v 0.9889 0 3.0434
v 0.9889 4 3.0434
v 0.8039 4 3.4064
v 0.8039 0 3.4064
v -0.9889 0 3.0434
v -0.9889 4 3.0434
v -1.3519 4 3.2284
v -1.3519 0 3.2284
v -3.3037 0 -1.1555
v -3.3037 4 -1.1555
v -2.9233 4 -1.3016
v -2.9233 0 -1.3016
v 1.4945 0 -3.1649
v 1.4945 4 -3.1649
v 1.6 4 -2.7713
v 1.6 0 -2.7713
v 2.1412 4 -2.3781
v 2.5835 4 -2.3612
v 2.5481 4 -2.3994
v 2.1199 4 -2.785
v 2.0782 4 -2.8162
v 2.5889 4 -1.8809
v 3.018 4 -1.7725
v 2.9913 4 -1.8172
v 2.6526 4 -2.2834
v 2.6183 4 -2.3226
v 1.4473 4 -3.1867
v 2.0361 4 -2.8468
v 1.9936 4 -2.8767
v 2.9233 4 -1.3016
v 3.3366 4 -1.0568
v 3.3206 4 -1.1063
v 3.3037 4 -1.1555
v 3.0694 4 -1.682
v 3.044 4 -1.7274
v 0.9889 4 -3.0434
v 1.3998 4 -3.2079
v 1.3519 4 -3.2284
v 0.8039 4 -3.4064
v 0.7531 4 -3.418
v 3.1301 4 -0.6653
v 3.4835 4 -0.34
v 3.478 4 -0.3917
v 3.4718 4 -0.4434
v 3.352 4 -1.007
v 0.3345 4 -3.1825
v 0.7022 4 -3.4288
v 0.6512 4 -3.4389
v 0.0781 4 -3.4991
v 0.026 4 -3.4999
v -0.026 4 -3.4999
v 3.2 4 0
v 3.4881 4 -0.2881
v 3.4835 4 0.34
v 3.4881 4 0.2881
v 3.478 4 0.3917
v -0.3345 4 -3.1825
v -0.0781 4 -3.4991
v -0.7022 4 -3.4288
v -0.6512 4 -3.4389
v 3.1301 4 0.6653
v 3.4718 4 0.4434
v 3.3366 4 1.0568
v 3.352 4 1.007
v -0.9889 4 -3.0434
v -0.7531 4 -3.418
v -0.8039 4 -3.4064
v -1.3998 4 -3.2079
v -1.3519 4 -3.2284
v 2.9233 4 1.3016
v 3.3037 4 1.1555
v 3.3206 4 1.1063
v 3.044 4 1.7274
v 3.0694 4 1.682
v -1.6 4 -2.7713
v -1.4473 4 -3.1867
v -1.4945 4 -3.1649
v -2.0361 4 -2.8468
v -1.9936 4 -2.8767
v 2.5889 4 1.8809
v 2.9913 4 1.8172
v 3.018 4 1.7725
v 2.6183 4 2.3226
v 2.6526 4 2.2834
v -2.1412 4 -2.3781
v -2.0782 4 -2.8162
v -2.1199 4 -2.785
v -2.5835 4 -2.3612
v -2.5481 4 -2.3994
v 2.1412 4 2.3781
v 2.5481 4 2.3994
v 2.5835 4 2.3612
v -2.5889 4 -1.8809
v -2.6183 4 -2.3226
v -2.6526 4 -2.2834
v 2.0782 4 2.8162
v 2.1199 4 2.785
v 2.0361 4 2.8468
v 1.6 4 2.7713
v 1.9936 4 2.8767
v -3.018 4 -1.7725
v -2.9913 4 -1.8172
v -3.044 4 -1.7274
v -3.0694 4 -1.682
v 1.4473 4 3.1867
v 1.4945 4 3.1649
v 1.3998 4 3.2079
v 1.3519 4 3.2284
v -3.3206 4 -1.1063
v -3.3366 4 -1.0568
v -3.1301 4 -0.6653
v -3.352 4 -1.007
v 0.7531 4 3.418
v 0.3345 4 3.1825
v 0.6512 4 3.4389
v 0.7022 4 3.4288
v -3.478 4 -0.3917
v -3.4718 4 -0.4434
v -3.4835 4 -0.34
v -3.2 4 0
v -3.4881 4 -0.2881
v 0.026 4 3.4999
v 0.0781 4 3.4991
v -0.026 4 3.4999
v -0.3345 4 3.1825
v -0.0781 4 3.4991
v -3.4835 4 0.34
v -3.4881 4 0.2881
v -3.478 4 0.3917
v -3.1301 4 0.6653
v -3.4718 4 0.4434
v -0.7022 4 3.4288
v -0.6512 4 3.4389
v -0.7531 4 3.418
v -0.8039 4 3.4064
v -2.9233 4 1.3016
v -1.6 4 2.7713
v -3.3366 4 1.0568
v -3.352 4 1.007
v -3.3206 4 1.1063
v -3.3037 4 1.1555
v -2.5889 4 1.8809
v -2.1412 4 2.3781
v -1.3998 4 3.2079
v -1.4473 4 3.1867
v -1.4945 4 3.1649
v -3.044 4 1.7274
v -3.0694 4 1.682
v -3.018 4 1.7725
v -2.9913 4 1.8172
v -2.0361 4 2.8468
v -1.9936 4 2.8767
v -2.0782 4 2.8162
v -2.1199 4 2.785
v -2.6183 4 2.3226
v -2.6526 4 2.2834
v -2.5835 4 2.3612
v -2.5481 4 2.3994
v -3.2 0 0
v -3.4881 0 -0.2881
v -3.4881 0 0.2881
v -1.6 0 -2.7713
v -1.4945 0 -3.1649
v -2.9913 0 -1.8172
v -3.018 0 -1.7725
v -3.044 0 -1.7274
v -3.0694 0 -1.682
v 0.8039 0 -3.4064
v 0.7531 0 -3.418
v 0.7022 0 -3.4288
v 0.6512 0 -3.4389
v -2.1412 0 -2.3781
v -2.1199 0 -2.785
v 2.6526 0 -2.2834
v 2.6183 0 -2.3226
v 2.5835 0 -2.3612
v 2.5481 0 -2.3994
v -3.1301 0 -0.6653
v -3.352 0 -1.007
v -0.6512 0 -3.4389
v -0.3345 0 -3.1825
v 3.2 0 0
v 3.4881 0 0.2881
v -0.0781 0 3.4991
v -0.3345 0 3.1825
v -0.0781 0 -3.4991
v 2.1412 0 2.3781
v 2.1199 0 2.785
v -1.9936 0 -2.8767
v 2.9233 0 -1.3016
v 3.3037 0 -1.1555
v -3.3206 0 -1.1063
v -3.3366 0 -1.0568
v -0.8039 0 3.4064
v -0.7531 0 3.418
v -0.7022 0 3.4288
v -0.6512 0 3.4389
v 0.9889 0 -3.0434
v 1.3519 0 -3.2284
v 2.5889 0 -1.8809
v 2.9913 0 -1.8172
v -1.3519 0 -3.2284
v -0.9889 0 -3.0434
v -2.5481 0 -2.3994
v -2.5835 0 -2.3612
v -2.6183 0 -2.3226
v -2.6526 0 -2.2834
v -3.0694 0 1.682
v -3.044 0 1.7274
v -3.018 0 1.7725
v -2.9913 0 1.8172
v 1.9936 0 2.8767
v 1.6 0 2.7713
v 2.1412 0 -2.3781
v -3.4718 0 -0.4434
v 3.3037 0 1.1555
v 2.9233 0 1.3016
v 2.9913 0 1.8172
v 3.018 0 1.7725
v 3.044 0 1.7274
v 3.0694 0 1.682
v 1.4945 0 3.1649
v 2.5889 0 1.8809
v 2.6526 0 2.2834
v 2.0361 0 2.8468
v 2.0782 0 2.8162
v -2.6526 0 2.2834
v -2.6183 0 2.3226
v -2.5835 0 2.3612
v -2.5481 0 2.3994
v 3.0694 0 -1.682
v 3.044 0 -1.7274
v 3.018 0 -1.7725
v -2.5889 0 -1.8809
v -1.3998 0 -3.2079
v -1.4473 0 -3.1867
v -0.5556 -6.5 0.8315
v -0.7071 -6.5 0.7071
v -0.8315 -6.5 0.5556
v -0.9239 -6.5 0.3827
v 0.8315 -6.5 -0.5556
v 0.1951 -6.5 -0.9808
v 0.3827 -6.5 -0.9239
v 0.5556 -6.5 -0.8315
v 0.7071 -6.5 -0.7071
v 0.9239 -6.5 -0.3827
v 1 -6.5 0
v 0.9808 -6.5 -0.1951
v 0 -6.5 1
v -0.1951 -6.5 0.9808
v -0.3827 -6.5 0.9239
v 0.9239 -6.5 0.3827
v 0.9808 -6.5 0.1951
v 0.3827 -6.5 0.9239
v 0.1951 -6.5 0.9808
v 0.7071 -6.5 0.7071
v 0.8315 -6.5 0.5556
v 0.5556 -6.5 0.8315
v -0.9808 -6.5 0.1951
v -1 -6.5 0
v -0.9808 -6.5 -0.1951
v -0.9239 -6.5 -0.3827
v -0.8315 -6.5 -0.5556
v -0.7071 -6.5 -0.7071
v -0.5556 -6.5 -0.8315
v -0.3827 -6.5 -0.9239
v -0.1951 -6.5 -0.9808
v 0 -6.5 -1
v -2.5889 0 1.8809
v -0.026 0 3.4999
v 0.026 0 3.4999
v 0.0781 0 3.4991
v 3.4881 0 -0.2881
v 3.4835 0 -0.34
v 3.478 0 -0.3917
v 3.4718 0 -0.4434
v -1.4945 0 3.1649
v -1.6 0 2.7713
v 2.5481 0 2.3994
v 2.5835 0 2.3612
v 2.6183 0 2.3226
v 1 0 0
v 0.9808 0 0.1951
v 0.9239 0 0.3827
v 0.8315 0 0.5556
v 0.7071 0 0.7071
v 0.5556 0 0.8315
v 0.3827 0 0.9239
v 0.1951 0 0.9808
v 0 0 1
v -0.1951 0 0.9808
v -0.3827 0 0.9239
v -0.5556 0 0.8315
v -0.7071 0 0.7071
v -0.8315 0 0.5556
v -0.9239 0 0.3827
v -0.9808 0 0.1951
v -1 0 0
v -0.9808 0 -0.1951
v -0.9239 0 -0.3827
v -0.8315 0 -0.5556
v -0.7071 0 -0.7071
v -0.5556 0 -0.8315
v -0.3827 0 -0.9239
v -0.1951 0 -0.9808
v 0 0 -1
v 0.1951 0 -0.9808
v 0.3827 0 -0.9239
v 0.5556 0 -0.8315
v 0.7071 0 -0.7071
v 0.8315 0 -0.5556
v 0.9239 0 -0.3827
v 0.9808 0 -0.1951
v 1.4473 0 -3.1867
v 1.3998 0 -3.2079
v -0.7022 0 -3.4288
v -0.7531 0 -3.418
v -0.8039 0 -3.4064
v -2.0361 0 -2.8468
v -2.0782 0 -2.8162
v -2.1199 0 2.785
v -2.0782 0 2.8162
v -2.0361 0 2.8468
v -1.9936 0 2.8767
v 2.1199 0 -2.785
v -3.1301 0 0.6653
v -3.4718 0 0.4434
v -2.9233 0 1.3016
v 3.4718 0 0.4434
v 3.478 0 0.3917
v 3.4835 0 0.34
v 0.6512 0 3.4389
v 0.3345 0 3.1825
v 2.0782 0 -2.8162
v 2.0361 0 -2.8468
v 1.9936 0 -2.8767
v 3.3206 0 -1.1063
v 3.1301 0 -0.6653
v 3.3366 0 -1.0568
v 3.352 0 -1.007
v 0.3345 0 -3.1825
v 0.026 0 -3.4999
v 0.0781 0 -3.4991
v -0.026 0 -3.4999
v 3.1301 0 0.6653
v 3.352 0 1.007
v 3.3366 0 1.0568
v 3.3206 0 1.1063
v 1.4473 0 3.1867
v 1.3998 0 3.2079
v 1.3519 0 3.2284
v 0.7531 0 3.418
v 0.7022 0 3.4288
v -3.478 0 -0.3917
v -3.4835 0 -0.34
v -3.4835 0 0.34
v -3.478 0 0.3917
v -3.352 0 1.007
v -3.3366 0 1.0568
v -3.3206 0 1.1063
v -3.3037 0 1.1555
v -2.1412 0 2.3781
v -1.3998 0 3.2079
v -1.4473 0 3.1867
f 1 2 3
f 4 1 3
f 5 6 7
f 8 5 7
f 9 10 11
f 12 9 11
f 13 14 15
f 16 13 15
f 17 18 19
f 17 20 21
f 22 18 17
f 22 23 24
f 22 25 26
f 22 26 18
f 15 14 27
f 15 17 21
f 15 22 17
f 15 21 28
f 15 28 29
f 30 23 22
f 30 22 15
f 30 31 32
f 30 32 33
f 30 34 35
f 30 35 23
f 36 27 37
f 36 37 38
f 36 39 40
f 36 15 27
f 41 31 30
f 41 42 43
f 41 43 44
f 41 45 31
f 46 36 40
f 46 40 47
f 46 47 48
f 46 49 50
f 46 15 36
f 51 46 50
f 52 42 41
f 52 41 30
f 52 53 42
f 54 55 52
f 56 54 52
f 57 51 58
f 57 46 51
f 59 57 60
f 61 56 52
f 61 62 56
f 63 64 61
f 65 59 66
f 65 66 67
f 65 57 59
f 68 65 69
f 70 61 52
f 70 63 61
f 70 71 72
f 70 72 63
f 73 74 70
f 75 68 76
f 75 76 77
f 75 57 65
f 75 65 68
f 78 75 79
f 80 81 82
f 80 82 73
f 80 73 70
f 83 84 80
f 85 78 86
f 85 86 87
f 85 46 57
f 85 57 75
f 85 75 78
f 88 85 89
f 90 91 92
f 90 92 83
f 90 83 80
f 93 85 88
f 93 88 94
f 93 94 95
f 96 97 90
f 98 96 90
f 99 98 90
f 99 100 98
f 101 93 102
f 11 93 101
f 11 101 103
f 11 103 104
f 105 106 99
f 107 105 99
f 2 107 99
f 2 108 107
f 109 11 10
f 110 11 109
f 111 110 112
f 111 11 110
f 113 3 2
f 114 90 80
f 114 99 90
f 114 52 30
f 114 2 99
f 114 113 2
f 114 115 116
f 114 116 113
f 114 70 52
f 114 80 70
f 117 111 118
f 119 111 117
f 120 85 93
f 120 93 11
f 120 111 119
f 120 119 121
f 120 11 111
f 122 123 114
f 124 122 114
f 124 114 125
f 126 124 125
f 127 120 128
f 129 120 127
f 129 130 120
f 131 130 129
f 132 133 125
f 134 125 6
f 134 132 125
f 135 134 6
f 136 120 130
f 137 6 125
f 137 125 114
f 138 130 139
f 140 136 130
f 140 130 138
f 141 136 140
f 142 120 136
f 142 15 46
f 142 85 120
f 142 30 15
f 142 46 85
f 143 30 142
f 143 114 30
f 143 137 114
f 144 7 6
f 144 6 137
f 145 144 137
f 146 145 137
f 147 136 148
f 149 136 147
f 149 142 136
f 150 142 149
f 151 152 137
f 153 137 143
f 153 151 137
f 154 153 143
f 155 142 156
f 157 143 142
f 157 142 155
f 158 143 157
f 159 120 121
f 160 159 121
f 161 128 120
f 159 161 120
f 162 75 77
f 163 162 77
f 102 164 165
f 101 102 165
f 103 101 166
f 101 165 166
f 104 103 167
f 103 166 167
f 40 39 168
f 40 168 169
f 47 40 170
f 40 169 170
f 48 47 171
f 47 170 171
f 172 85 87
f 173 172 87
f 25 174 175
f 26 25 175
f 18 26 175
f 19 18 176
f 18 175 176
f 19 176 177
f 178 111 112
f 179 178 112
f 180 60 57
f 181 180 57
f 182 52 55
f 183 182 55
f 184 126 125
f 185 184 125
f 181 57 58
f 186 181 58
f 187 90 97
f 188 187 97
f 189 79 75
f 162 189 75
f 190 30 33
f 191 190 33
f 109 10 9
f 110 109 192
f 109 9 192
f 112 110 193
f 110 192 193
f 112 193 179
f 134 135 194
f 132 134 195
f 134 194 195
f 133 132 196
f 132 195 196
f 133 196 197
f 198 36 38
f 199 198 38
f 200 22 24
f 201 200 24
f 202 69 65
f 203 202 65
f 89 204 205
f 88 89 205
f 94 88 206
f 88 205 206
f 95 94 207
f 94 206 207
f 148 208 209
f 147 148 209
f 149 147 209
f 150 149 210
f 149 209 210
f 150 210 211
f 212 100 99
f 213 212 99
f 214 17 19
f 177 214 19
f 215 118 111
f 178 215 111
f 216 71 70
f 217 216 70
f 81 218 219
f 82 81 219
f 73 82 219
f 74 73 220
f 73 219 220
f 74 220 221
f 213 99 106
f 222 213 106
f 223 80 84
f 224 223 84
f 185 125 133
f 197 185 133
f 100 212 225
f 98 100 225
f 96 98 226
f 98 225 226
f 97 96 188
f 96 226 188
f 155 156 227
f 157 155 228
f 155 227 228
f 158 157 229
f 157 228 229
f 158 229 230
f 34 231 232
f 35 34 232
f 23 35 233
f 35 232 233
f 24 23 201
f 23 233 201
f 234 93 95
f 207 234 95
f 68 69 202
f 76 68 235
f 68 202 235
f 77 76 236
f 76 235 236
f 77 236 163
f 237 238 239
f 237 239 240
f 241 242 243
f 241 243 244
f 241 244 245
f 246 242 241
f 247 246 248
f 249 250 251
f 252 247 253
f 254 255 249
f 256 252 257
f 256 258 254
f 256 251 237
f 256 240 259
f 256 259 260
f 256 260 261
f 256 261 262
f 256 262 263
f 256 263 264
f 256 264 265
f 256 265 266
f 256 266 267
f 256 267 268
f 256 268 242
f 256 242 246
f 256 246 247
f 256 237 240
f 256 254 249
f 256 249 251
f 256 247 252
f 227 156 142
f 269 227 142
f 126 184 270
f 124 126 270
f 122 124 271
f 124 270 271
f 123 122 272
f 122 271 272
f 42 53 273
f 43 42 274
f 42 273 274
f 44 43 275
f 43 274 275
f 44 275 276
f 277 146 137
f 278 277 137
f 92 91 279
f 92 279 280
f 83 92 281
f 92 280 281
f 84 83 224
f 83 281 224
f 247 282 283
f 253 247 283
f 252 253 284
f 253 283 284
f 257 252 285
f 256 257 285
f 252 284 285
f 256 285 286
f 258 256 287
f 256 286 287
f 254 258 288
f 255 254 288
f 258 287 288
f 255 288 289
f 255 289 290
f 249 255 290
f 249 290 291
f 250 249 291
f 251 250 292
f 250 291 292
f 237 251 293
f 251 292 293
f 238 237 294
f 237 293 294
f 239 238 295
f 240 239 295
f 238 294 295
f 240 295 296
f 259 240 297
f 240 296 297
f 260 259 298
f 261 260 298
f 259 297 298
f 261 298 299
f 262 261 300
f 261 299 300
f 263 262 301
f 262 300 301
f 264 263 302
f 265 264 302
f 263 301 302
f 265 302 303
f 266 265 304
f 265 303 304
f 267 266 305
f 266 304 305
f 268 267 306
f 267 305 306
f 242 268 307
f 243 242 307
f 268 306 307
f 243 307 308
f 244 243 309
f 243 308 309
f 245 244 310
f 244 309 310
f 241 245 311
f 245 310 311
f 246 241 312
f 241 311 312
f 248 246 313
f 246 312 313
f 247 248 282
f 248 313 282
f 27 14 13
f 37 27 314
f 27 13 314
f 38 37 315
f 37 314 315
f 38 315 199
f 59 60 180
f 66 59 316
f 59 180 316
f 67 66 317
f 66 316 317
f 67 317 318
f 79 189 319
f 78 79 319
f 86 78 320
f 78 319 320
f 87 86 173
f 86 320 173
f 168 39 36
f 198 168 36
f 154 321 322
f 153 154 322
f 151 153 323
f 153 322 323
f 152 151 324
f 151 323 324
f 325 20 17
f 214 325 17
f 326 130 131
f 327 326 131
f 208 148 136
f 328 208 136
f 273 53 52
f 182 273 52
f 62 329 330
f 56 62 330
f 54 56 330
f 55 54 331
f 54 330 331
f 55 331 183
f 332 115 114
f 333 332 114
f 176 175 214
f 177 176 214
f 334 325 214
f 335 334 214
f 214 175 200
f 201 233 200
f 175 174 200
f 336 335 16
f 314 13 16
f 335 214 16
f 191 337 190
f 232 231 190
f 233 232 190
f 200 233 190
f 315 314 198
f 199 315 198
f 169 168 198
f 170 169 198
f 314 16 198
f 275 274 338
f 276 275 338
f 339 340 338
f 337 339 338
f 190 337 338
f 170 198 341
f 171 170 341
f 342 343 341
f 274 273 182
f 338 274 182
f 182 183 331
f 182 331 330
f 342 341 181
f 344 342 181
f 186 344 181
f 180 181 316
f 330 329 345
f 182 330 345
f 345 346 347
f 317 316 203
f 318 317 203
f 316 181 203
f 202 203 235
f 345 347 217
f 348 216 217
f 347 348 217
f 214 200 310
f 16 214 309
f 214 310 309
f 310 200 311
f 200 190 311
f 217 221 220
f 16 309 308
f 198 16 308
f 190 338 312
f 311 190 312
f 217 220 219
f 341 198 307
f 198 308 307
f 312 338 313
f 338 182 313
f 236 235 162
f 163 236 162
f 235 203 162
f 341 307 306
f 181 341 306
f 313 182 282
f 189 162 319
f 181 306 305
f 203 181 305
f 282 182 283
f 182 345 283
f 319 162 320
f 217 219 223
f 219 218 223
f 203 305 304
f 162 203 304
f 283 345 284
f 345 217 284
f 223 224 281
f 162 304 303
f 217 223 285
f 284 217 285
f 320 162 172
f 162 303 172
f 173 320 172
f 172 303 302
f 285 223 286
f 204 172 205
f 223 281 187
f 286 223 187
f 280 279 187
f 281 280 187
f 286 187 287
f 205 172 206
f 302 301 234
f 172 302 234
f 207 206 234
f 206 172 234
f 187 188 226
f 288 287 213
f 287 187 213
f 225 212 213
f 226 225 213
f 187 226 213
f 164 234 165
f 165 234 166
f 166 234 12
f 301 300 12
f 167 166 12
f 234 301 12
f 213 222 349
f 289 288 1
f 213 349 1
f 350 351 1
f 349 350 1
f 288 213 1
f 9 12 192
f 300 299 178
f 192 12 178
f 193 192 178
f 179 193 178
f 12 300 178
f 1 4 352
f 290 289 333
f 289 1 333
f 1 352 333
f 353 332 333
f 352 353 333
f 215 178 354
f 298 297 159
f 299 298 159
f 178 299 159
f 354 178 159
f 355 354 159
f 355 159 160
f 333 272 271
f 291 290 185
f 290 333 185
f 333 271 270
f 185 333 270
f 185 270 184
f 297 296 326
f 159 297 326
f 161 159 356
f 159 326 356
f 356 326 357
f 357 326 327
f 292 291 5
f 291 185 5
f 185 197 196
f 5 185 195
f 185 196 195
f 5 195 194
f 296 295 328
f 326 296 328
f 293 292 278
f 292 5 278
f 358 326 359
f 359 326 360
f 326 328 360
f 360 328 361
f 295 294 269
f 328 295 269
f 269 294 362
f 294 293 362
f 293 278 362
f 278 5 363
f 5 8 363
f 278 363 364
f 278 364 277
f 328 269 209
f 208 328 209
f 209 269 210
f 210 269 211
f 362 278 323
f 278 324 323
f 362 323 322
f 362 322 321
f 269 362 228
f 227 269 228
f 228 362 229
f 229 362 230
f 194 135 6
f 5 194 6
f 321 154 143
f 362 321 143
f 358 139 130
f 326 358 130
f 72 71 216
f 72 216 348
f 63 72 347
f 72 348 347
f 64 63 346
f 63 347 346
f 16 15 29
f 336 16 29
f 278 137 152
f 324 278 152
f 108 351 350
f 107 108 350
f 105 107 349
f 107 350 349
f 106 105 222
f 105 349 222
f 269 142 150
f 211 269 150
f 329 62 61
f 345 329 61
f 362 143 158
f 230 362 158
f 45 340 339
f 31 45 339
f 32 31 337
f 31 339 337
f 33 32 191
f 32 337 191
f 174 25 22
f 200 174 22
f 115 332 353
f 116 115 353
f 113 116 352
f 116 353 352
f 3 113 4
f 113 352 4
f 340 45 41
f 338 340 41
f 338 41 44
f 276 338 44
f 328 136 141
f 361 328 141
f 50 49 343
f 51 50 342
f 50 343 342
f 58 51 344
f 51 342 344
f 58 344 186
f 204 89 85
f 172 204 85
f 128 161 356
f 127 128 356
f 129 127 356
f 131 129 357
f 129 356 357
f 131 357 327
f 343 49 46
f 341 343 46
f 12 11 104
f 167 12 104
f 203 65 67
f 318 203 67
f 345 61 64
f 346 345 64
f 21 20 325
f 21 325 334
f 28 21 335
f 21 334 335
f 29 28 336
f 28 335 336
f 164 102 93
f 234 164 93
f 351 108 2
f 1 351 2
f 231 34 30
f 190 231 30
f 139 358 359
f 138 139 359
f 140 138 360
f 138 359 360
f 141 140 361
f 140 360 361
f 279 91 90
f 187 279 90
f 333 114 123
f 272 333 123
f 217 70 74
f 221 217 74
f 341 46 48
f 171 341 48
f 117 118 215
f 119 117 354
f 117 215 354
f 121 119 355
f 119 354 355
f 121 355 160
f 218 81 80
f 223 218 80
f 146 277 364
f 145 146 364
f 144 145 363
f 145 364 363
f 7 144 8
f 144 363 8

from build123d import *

# Parameters (mm, degrees)
F0_R            = 1
F1_DEPTH        = 6.5
F2_R            = 3.5
F3_DEPTH        = 4
F5_DEPTH        = 10.501
F5_COPIES_COUNT = 30


# Not quite as in the source:
# - a pattern or mirror of a feature is missing from the dataset's text; its kind, count and spacing are read off the source's solid


with BuildPart() as f1:
    # F0 (on Front) → F1 (new body)
    with BuildSketch(Plane.XZ):
        Circle(F0_R)
    extrude(amount=F1_DEPTH)

    # F2 (on face) → F3 (join)
    with BuildSketch(Plane(origin=(0, 0, 0), x_dir=(-1, 0, 0), z_dir=(0, 1, 0))):
        Circle(F2_R)
    extrude(amount=F3_DEPTH)

    # F4 (on face) → F5 (cut, through all)
    with BuildSketch(Plane(origin=(0, 4, 0), x_dir=(-1, 0, 0), z_dir=(0, 1, 0))):
        with BuildLine():
            Line((3.2, 0), (3.4881207588, -0.2881207588))
            ThreePointArc((3.4881207588, -0.2881207588), (3.5, 0), (3.4881207588, 0.2881207588))
            Line((3.4881207588, 0.2881207588), (3.2, 0))
        make_face()
    f5 = extrude(amount=-F5_DEPTH, mode=Mode.SUBTRACT)

    # F5_copies: F5 ×30 about axis
    f5_copies_axis = Axis((0, 0, 0), (0, 1, 0))
    for i in range(1, F5_COPIES_COUNT):
        add(f5.rotate(f5_copies_axis, i * 360 / F5_COPIES_COUNT), mode=Mode.SUBTRACT)


solid = f1.part
